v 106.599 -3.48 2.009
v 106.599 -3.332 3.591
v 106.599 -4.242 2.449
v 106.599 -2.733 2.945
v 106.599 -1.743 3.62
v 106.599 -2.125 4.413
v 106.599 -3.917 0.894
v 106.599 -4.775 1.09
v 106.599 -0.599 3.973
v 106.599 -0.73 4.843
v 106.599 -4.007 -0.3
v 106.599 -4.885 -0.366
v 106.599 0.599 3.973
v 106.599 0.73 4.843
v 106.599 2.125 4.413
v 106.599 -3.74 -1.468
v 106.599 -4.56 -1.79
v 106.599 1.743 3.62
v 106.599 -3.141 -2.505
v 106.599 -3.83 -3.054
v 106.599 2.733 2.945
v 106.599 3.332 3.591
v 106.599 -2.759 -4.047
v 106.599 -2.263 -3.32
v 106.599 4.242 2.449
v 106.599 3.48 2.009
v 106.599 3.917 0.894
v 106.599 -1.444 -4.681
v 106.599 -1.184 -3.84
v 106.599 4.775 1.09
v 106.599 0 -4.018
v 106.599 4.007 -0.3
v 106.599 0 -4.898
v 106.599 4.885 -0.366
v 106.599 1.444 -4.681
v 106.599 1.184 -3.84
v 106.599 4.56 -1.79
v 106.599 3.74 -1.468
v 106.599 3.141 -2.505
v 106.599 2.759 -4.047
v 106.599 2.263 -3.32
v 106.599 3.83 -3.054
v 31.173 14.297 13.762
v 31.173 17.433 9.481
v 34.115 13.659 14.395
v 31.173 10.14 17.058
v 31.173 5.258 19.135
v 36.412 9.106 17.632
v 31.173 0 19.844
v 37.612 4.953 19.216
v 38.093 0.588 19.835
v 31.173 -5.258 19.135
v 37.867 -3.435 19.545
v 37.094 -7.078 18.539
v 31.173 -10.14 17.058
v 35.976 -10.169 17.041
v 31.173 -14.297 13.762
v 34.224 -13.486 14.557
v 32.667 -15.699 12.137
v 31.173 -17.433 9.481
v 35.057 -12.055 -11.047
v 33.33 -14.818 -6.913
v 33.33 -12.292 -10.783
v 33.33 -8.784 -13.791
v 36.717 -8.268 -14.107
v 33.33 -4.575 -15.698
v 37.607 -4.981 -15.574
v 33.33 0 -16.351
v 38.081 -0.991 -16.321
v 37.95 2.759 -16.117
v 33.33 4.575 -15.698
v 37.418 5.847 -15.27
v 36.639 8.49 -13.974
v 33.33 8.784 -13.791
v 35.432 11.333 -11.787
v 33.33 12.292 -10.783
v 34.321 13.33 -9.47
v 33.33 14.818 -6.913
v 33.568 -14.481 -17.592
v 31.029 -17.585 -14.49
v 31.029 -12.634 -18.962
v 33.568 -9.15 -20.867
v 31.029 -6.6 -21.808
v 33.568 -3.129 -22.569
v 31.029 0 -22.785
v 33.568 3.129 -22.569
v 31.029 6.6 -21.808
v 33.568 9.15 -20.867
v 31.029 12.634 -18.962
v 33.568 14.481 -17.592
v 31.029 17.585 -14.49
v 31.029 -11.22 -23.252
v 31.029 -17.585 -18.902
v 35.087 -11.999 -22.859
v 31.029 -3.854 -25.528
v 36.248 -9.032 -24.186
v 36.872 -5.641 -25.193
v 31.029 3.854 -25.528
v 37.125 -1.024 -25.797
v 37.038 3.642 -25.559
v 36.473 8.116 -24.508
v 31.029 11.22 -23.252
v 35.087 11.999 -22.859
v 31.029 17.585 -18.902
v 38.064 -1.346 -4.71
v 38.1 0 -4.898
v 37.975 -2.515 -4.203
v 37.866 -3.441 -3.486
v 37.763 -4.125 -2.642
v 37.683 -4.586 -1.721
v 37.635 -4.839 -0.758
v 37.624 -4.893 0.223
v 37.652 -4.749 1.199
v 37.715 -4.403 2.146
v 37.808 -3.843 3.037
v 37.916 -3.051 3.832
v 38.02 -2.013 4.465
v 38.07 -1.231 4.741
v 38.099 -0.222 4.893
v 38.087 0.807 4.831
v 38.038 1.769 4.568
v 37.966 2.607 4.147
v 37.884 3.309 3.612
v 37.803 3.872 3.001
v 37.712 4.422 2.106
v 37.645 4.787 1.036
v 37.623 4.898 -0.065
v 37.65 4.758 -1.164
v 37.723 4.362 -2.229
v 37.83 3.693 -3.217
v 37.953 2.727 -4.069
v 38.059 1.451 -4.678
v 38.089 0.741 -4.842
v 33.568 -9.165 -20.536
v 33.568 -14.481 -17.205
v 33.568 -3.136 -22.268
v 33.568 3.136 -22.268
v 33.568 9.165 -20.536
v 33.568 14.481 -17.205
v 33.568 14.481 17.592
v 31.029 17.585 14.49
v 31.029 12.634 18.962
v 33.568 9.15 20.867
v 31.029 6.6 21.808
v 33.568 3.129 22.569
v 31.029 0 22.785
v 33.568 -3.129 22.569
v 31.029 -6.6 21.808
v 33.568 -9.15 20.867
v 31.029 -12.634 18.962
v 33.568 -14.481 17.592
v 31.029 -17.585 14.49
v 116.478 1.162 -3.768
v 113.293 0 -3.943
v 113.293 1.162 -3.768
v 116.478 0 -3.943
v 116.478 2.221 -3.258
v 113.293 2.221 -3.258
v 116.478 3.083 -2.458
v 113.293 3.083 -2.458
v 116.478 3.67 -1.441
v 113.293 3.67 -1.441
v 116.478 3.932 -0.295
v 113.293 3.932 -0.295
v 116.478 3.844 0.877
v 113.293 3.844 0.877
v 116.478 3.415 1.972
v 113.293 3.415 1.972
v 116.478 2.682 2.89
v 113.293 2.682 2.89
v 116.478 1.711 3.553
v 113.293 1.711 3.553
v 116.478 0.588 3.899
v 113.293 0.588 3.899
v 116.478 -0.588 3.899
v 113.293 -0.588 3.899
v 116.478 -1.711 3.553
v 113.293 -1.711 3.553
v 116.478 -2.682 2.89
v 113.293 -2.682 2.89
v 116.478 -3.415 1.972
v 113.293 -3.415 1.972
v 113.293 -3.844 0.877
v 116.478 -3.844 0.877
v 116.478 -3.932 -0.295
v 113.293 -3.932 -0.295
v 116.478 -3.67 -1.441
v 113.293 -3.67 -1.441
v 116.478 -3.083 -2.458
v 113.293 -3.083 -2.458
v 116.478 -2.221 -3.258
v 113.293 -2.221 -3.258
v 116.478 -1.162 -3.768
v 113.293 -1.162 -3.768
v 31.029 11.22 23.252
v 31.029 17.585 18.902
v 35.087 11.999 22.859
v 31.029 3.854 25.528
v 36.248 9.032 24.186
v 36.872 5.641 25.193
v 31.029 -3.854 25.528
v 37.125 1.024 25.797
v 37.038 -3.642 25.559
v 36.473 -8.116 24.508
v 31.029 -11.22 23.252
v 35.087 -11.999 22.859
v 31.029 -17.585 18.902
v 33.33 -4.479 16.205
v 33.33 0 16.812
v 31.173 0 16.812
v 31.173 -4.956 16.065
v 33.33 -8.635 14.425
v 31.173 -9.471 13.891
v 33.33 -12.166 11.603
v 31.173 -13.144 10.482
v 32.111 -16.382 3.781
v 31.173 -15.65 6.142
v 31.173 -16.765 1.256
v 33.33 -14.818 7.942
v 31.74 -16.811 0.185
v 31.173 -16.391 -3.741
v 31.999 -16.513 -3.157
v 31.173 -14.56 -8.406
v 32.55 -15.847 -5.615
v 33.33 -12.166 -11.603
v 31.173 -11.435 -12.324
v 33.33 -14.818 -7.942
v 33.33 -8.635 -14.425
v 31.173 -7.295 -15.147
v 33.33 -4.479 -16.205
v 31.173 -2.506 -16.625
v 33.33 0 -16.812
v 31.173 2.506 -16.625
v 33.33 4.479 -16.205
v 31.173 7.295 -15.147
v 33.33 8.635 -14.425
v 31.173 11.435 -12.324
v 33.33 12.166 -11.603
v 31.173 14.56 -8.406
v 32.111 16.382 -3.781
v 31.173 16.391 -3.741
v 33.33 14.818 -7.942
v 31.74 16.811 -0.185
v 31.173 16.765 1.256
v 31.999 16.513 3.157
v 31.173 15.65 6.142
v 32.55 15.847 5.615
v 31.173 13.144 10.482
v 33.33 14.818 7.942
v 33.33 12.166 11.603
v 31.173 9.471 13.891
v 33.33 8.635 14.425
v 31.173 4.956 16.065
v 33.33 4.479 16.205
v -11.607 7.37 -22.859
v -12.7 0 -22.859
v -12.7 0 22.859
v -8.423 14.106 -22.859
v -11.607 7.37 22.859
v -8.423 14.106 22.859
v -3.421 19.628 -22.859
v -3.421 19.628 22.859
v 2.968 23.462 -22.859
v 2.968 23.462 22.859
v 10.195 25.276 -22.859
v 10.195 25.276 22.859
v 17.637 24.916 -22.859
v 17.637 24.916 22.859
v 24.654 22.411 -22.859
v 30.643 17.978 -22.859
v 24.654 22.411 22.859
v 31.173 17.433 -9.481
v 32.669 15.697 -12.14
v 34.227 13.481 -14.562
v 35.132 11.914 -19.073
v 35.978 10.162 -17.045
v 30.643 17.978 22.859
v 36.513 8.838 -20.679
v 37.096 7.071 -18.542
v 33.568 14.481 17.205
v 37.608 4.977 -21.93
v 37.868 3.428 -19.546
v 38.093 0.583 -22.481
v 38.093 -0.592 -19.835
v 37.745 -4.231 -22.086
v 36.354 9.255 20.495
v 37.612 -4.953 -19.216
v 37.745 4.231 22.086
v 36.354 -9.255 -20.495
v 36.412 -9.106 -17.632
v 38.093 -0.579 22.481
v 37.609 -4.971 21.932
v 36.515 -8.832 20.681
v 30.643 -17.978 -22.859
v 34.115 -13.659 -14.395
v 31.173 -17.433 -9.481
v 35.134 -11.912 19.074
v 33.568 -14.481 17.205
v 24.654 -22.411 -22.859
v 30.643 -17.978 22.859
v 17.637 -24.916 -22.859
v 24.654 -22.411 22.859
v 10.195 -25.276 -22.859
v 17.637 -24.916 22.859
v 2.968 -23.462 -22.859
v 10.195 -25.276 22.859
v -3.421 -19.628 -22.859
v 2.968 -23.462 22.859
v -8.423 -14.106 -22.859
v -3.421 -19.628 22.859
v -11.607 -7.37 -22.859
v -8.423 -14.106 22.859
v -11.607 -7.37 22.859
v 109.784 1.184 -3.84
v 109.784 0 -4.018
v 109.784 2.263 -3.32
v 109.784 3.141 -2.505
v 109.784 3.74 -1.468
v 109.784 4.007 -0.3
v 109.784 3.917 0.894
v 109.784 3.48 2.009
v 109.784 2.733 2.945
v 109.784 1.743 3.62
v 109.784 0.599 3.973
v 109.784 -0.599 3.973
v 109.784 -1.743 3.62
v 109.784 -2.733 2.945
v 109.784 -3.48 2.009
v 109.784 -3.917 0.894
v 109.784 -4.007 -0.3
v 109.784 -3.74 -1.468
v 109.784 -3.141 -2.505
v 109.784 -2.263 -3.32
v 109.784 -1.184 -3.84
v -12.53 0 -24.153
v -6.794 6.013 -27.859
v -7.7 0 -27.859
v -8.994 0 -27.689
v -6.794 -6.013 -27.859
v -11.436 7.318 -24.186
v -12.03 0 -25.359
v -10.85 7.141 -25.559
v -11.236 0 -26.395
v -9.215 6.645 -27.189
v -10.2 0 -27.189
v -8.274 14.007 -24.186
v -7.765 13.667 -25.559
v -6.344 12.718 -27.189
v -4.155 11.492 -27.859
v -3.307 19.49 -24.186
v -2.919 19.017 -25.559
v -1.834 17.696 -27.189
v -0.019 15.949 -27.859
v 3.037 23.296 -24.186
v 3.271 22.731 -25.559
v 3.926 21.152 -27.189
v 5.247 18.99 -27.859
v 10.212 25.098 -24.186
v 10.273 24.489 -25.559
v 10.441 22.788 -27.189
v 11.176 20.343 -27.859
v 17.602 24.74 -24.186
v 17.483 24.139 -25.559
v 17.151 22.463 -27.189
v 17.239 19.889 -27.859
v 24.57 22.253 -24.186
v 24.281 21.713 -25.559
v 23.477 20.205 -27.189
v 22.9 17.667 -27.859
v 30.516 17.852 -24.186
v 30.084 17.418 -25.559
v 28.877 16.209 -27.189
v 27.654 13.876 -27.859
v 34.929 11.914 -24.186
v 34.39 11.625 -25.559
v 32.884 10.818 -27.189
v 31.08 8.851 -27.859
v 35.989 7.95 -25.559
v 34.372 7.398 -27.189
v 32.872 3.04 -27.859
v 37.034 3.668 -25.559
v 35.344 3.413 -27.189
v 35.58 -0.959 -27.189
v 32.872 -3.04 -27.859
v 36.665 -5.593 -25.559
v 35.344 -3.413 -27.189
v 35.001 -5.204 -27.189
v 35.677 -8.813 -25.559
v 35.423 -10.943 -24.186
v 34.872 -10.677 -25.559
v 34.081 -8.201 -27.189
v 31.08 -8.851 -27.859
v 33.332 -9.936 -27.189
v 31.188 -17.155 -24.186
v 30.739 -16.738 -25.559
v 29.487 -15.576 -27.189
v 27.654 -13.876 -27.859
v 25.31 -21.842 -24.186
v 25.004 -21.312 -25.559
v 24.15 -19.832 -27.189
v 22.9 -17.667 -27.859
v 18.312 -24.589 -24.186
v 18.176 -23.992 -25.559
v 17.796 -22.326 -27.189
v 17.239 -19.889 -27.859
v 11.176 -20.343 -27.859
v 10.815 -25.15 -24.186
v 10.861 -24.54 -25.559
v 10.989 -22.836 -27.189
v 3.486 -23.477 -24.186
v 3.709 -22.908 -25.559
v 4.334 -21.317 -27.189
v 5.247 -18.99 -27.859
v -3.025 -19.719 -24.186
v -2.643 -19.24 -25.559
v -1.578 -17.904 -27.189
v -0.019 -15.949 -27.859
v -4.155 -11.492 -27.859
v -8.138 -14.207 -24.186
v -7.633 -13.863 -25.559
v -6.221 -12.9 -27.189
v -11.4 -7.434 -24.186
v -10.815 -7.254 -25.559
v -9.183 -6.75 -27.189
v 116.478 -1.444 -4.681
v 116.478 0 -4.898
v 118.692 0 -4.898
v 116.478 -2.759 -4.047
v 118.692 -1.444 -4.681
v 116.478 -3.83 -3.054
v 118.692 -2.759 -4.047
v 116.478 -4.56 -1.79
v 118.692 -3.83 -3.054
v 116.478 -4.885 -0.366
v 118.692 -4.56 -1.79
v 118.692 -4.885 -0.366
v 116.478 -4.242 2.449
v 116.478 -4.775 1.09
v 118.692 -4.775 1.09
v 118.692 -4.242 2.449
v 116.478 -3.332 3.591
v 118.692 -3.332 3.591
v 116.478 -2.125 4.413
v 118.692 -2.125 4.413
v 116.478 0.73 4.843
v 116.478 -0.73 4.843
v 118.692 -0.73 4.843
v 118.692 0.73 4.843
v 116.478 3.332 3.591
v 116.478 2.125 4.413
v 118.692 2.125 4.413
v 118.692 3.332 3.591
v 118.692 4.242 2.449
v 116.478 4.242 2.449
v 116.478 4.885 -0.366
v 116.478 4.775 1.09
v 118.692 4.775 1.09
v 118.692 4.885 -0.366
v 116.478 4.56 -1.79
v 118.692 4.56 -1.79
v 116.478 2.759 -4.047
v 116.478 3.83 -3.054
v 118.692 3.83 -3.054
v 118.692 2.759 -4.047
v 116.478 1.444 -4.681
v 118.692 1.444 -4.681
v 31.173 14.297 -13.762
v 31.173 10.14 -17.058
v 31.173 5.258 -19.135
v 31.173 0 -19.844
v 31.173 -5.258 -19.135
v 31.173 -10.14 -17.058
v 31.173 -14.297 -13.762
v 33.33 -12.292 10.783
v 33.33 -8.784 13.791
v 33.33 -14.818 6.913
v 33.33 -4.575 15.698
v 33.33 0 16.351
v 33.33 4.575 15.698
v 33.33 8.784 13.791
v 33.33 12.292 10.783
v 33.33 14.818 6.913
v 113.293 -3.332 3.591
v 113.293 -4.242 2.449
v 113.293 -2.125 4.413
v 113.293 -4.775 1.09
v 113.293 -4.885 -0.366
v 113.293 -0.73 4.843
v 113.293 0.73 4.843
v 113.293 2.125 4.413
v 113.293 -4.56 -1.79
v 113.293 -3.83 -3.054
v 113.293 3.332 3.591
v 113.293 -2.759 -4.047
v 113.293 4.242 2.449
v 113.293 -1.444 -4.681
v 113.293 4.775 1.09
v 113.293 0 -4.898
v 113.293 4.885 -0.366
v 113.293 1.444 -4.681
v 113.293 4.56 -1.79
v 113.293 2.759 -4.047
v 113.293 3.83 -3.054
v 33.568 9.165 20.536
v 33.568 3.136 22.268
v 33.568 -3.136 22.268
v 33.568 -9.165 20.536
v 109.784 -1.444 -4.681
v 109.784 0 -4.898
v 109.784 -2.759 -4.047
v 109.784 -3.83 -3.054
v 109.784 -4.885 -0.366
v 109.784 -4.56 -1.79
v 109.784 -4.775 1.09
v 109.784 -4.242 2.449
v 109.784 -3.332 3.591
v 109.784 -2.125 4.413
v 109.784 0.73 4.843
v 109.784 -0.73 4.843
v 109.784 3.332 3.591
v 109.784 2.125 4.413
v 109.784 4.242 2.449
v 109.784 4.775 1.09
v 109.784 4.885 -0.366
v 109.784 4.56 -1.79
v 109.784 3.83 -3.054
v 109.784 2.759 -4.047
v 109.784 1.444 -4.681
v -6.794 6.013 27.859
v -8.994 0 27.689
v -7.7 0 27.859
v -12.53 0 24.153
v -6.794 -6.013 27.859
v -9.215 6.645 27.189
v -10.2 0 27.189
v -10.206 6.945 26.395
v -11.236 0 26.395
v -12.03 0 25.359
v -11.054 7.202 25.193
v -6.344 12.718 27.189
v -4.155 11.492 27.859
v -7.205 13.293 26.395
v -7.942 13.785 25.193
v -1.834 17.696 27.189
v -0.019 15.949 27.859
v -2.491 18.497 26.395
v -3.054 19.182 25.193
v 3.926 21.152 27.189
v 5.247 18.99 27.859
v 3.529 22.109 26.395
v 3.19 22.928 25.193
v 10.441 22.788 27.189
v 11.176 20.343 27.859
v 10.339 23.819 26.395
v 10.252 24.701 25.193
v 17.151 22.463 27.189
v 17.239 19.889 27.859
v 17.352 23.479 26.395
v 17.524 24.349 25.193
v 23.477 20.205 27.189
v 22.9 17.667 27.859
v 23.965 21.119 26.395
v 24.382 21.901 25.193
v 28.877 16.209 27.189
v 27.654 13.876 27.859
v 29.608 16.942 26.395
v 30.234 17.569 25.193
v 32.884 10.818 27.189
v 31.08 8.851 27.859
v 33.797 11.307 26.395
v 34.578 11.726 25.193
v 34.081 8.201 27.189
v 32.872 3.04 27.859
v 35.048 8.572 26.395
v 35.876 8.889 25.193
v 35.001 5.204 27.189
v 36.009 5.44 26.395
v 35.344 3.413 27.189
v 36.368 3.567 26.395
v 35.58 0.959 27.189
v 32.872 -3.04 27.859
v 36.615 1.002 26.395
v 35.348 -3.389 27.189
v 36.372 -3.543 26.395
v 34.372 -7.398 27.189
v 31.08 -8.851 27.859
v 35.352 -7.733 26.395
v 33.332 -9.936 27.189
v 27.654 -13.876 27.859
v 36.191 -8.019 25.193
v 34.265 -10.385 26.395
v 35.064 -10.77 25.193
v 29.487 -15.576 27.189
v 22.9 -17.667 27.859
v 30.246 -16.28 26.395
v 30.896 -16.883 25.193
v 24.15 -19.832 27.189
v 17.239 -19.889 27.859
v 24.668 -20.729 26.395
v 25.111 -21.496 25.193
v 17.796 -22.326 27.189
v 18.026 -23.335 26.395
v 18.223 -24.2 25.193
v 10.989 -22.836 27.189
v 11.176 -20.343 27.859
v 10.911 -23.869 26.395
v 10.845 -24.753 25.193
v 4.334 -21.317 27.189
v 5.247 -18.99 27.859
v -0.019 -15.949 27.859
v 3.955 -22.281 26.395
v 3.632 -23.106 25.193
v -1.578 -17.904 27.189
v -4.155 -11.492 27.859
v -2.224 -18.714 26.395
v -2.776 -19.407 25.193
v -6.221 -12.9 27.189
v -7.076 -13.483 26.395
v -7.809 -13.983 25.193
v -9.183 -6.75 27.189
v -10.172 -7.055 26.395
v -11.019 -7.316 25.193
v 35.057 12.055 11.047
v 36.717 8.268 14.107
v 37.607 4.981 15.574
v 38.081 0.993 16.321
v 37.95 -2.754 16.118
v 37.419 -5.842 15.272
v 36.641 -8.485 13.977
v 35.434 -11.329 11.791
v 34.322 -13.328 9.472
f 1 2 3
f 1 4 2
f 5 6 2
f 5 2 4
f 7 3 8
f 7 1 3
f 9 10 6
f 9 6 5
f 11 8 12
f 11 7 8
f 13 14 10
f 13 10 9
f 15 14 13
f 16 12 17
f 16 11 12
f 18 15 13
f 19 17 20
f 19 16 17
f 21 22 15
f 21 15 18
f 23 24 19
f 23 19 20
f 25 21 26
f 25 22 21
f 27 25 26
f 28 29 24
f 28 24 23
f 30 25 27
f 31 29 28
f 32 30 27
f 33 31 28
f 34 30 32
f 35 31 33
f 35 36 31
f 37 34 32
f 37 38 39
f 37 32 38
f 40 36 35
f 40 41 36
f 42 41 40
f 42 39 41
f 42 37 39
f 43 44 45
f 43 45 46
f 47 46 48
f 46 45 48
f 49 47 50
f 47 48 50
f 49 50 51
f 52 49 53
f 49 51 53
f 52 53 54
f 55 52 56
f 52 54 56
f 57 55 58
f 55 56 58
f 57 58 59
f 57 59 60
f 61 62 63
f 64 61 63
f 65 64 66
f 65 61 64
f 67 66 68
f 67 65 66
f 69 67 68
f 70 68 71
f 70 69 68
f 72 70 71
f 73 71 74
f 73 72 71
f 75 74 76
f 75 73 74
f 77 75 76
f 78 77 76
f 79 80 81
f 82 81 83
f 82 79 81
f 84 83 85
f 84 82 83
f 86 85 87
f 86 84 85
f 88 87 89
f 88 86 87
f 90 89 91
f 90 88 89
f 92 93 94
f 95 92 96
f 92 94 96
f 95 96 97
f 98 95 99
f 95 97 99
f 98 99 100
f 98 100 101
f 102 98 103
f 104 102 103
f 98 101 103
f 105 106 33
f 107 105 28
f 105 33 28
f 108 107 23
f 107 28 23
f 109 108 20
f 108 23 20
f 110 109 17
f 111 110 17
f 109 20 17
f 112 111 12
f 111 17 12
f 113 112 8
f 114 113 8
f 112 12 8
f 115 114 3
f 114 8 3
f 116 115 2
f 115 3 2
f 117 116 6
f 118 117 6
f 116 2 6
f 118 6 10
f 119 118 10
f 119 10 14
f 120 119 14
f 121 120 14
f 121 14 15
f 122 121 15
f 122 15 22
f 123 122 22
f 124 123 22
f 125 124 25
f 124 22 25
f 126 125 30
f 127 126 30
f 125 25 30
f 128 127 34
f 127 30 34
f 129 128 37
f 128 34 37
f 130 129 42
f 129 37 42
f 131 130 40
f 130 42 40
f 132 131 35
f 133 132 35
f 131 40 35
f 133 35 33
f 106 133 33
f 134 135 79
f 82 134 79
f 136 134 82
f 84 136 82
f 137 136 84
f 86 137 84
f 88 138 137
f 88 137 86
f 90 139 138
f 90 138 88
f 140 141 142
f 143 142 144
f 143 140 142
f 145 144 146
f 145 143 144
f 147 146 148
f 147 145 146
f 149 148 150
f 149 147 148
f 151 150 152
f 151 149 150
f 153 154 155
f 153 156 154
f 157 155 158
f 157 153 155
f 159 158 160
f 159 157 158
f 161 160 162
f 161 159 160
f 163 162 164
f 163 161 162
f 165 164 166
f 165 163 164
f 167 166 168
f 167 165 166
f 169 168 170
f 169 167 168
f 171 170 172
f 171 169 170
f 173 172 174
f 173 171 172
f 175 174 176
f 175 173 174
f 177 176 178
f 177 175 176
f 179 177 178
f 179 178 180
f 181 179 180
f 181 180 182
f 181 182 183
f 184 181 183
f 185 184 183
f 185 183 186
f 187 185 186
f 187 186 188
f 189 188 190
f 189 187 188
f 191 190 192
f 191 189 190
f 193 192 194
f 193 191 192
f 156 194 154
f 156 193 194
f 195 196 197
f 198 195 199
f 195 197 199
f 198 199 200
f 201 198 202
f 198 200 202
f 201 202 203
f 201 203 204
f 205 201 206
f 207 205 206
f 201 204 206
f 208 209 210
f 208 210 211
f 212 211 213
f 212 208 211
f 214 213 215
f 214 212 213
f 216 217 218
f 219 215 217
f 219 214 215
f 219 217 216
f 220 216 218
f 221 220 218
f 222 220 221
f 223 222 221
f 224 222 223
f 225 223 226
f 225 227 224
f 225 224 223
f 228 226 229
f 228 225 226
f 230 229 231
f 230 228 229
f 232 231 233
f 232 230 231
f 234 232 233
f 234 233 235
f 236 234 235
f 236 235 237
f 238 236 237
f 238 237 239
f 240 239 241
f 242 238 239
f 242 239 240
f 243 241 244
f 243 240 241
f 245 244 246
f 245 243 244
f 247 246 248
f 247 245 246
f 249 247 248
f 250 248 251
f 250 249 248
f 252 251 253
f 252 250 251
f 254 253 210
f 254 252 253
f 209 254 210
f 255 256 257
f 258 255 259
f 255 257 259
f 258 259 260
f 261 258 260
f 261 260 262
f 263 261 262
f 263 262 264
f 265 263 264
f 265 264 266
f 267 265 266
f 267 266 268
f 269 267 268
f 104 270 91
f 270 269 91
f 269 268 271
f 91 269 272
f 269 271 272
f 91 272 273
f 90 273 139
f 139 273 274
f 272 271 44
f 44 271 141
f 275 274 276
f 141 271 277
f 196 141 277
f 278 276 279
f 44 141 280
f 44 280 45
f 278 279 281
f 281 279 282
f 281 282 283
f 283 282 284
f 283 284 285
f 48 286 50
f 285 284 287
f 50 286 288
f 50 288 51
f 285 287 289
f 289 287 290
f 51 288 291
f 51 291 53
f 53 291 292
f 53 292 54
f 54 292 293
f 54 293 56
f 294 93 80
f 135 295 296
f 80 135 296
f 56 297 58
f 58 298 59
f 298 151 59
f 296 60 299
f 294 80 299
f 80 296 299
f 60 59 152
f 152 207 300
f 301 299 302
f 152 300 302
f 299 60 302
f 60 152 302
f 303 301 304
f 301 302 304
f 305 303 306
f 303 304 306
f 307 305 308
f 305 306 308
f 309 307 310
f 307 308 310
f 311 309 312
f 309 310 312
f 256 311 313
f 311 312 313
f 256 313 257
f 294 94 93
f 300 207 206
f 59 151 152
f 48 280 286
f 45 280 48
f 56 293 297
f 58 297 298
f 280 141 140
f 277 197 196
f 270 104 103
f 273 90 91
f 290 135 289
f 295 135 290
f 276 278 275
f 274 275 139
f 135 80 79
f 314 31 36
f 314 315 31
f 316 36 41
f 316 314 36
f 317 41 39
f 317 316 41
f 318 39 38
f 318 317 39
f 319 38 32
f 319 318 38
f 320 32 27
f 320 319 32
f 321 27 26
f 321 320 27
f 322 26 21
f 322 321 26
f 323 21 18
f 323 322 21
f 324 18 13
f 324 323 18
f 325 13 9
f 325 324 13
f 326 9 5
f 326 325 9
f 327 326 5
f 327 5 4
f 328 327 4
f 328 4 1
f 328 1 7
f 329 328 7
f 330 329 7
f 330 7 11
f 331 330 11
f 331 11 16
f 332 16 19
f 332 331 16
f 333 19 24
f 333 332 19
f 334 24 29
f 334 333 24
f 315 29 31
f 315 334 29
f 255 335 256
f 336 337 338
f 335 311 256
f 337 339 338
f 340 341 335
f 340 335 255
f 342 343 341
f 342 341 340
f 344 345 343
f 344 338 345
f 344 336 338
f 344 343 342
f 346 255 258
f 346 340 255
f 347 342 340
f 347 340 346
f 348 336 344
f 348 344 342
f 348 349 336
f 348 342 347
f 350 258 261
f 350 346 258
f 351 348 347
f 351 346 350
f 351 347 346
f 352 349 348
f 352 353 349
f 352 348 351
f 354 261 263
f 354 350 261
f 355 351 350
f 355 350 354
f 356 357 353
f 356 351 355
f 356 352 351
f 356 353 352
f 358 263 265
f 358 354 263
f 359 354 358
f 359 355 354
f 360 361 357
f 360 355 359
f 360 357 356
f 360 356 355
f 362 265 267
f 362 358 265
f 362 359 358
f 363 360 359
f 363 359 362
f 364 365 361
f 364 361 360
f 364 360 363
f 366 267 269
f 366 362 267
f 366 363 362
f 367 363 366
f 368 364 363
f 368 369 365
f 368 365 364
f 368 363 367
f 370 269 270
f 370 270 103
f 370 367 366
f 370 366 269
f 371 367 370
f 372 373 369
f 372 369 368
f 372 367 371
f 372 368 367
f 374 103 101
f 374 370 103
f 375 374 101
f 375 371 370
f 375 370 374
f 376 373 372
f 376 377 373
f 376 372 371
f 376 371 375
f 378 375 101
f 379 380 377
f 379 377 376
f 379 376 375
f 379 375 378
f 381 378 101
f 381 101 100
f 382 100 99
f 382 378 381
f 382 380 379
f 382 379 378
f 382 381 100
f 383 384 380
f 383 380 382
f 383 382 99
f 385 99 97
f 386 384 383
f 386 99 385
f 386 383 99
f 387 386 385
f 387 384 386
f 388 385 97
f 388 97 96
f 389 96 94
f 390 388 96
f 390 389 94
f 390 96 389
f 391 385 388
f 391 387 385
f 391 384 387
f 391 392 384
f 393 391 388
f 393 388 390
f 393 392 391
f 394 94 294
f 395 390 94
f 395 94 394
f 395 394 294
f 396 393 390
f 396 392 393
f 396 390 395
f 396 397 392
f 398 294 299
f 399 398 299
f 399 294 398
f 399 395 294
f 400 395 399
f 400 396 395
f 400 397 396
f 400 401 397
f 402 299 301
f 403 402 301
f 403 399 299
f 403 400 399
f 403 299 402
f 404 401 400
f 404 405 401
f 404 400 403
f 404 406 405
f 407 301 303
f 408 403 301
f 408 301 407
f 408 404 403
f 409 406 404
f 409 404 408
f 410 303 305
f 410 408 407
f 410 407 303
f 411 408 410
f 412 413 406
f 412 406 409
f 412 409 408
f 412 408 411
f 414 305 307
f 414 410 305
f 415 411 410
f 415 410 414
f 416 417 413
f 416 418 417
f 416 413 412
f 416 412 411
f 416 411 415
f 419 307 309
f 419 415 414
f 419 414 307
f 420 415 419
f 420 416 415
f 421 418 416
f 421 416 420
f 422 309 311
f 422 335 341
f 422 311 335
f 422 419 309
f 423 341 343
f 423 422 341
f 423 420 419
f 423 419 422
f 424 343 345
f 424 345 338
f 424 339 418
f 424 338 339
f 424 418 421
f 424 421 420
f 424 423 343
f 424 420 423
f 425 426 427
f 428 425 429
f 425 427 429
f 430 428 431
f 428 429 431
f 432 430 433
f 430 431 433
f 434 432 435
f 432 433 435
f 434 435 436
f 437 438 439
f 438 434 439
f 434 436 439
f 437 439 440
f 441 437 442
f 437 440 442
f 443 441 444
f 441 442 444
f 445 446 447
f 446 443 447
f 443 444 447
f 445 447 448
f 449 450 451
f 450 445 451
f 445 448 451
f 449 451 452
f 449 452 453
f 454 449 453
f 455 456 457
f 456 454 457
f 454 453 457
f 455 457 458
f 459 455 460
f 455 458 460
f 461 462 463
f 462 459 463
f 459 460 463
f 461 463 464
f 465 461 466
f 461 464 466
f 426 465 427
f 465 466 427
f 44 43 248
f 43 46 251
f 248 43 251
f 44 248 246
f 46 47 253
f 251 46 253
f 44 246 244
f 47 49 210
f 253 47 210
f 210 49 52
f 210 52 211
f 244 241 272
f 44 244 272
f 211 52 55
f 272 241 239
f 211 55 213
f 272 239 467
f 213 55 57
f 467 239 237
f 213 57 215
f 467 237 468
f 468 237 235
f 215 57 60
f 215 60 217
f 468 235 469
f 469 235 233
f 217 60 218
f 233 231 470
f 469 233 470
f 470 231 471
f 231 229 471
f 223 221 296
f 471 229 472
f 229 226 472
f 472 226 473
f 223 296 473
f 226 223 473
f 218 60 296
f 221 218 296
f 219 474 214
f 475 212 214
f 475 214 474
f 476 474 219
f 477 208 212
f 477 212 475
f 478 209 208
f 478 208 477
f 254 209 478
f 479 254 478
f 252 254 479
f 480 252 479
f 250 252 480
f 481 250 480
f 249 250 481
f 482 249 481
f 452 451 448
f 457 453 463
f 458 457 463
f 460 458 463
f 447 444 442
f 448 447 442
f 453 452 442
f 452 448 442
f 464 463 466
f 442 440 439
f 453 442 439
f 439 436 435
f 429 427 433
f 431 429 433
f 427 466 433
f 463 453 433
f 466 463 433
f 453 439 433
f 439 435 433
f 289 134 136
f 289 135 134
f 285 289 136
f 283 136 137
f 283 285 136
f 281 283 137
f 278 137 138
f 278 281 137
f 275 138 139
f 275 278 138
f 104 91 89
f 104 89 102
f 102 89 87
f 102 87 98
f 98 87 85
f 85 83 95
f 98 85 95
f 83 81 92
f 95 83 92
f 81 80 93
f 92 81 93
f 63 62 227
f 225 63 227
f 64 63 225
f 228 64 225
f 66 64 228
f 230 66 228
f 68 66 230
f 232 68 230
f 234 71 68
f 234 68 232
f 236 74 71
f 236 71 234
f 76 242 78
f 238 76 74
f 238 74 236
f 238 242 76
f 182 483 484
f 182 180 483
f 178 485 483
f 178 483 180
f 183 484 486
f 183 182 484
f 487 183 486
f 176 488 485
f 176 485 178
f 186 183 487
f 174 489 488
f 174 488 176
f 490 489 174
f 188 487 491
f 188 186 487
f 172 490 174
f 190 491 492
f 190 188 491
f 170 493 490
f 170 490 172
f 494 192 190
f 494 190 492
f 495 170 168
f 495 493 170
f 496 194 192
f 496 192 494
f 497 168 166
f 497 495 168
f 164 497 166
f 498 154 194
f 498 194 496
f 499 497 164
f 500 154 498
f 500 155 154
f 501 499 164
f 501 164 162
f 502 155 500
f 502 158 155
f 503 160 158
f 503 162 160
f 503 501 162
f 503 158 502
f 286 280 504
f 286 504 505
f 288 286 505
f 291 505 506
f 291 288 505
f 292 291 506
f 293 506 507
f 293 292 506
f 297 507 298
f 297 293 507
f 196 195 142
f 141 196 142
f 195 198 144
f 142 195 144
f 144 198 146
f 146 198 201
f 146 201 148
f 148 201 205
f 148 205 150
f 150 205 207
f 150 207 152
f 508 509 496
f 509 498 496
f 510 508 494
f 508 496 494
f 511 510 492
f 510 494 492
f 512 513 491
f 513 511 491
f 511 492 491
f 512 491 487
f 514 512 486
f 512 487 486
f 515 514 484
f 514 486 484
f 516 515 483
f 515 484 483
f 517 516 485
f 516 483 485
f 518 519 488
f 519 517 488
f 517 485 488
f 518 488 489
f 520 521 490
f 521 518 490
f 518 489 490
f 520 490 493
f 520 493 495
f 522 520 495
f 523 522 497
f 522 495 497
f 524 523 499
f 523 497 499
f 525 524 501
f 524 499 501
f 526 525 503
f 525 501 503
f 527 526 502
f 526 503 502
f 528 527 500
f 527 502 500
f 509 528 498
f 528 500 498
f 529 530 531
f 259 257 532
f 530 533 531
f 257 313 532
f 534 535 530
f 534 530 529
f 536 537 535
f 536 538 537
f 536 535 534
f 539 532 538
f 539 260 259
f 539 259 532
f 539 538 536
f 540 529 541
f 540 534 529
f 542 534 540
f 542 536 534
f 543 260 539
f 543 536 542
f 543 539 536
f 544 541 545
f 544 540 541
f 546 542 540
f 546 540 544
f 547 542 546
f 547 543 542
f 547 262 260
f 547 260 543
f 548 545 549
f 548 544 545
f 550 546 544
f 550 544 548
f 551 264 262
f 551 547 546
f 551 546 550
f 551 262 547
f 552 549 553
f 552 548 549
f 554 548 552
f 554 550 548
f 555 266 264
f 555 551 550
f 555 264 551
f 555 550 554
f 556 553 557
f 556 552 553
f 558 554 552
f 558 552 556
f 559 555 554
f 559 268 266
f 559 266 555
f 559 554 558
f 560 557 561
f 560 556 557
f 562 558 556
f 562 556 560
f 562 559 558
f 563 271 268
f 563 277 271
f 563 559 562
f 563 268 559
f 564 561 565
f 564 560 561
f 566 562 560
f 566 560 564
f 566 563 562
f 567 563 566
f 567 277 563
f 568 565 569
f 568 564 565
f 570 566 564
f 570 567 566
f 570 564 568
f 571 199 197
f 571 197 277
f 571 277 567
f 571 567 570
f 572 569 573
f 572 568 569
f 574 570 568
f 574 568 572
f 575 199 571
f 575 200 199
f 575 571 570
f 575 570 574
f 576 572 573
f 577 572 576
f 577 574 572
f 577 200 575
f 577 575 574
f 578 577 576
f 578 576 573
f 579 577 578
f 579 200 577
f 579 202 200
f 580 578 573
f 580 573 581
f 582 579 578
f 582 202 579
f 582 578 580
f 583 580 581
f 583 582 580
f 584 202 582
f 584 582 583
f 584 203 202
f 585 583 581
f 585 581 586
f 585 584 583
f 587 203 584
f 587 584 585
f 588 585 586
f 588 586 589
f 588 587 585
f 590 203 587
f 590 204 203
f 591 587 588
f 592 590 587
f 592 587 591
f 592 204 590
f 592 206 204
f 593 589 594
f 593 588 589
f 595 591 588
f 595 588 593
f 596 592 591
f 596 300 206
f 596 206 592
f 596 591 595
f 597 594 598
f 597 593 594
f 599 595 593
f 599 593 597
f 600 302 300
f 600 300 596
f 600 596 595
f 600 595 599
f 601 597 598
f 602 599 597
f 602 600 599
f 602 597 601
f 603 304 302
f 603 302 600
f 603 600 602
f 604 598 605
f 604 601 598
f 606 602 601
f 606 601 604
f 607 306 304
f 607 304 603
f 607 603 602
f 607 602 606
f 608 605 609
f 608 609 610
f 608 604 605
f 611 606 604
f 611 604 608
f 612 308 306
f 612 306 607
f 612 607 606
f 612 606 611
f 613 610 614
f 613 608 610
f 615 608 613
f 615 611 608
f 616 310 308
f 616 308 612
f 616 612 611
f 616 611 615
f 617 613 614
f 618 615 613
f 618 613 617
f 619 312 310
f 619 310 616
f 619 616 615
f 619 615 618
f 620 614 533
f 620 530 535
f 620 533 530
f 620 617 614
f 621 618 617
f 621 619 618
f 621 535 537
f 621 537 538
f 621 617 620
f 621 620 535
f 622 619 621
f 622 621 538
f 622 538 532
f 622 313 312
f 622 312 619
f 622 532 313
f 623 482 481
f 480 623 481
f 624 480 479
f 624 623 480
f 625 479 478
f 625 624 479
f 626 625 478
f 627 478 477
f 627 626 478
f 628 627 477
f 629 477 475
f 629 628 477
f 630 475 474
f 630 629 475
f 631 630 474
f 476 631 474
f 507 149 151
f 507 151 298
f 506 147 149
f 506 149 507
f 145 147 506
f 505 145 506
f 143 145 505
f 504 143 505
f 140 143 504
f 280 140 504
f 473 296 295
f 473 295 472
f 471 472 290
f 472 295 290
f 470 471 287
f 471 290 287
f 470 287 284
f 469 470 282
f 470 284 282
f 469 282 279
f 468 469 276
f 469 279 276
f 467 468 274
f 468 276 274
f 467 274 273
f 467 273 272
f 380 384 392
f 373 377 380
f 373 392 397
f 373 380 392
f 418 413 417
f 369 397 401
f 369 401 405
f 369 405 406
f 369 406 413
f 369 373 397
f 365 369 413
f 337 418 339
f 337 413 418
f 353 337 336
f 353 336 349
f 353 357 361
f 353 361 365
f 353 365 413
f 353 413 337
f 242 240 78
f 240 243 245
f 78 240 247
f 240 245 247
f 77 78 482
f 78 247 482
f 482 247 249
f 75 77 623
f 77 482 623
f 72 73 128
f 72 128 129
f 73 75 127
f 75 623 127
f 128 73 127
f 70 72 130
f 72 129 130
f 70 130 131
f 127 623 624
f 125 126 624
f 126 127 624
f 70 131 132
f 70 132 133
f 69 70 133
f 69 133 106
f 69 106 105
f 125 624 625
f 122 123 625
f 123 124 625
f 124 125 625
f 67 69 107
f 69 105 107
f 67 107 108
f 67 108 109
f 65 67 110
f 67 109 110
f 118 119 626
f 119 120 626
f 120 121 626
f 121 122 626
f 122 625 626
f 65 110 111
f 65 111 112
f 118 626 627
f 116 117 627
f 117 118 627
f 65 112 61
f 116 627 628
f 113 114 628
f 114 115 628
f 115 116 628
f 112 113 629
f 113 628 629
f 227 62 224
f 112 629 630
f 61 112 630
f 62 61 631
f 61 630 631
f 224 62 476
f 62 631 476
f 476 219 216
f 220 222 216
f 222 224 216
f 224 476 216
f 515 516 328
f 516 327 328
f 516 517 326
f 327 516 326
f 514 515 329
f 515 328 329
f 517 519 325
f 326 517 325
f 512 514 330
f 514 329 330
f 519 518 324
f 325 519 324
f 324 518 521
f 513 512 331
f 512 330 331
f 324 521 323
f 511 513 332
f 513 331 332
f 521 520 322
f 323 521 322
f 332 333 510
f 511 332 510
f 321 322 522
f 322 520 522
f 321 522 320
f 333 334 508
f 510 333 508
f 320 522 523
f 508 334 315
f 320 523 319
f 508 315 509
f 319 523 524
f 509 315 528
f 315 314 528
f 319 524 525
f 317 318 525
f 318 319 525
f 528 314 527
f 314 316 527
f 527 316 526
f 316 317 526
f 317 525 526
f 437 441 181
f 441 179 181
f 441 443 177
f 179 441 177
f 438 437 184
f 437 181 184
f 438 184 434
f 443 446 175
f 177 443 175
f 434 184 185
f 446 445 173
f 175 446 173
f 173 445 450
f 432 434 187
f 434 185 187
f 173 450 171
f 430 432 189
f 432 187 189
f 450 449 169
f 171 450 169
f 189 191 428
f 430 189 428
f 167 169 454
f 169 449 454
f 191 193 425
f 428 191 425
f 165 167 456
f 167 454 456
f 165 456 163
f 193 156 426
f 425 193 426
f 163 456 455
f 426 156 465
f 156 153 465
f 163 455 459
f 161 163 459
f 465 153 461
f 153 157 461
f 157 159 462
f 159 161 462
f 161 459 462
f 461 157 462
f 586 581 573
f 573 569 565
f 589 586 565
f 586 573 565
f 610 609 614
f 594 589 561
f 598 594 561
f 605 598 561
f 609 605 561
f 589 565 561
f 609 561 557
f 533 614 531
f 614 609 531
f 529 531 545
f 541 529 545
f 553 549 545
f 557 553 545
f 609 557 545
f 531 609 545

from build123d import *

# Parameters (mm, degrees)
F0_W   = 25.4
F0_H   = 55.7187045847
F2_W   = 118.6923170462
F2_H   = 4.8982012086
F4_W   = 3.185287118
F4_H   = 12.2274383903
F4_W_2 = 20.8224356174
F4_H_2 = 3.0317753553


# Not quite as in the source:
# - a fillet or chamfer that OpenCascade refuses, or shapes differently, is made with other operations: its cross-section is extruded or revolved along the edge and cut away or added


with BuildPart() as f1:
    # F0 (on Front) → F1 (revolve)
    with BuildSketch(Plane.XZ):
        Rectangle(F0_W, F0_H)
    revolve(axis=Axis((12.7, 0, 0), (0, 0, -1)))

    # F2 (on Front) → F3 (revolve)
    with BuildSketch(Plane.XZ):
        with Locations((59.3461585231, -2.4491006043)):
            Rectangle(F2_W, F2_H)
    revolve(axis=Axis((59.3461585231, 0, 0), (-1, 0, 0)))

    # F4 (on Front) → F6 (revolve, cut)
    with BuildSketch(Plane.XZ):
        with Locations((114.8856207728, -10.0567732006)):
            Rectangle(F4_W, F4_H)
        with Locations((108.191460371, -10.1317744702)):
            Rectangle(F4_W, F4_H)
        with Locations((43.9788103104, -24.0039676428)):
            Rectangle(F4_W_2, F4_H_2)
        with Locations((43.7408648431, -17.8672224283)):
            Rectangle(F4_W_2, F4_H_2)
        with Locations((41.584610939, 18.3283146471)):
            Rectangle(F4_W_2, F4_H_2)
        with Locations((41.4398871362, 24.3011359125)):
            Rectangle(F4_W_2, F4_H_2)
    revolve(axis=Axis((52.5897778571, 0, 0), (1, 0, 0)), mode=Mode.SUBTRACT)

    # F7: fillet of radius 5 on 1 edges, made by hand

    # F7_s1 → F7_t2 (revolve, cut)
    with BuildSketch(Plane.XZ):
        with BuildLine():
            ThreePointArc((-12.7, -22.8593522923), (-11.2355339059, -26.3948861983), (-7.7, -27.8593522923))
            Line((-7.7, -27.8593522923), (-12.7, -27.8593522923))
            Line((-12.7, -27.8593522923), (-12.7, -22.8593522923))
        make_face()
    revolve(axis=Axis((12.7, 0, -27.8593522923), (0, 0, -1)), mode=Mode.SUBTRACT)

    # F8: fillet of radius 5 on 1 edges, made by hand

    # F8_s1 → F8_t2 (revolve, cut)
    with BuildSketch(Plane.XZ):
        with BuildLine():
            ThreePointArc((-7.7, 27.8593522923), (-11.2355339059, 26.3948861983), (-12.7, 22.8593522923))
            Line((-12.7, 22.8593522923), (-12.7, 27.8593522923))
            Line((-12.7, 27.8593522923), (-7.7, 27.8593522923))
        make_face()
    revolve(axis=Axis((12.7, 0, 27.8593522923), (0, 0, -1)), mode=Mode.SUBTRACT)


solid = f1.part
